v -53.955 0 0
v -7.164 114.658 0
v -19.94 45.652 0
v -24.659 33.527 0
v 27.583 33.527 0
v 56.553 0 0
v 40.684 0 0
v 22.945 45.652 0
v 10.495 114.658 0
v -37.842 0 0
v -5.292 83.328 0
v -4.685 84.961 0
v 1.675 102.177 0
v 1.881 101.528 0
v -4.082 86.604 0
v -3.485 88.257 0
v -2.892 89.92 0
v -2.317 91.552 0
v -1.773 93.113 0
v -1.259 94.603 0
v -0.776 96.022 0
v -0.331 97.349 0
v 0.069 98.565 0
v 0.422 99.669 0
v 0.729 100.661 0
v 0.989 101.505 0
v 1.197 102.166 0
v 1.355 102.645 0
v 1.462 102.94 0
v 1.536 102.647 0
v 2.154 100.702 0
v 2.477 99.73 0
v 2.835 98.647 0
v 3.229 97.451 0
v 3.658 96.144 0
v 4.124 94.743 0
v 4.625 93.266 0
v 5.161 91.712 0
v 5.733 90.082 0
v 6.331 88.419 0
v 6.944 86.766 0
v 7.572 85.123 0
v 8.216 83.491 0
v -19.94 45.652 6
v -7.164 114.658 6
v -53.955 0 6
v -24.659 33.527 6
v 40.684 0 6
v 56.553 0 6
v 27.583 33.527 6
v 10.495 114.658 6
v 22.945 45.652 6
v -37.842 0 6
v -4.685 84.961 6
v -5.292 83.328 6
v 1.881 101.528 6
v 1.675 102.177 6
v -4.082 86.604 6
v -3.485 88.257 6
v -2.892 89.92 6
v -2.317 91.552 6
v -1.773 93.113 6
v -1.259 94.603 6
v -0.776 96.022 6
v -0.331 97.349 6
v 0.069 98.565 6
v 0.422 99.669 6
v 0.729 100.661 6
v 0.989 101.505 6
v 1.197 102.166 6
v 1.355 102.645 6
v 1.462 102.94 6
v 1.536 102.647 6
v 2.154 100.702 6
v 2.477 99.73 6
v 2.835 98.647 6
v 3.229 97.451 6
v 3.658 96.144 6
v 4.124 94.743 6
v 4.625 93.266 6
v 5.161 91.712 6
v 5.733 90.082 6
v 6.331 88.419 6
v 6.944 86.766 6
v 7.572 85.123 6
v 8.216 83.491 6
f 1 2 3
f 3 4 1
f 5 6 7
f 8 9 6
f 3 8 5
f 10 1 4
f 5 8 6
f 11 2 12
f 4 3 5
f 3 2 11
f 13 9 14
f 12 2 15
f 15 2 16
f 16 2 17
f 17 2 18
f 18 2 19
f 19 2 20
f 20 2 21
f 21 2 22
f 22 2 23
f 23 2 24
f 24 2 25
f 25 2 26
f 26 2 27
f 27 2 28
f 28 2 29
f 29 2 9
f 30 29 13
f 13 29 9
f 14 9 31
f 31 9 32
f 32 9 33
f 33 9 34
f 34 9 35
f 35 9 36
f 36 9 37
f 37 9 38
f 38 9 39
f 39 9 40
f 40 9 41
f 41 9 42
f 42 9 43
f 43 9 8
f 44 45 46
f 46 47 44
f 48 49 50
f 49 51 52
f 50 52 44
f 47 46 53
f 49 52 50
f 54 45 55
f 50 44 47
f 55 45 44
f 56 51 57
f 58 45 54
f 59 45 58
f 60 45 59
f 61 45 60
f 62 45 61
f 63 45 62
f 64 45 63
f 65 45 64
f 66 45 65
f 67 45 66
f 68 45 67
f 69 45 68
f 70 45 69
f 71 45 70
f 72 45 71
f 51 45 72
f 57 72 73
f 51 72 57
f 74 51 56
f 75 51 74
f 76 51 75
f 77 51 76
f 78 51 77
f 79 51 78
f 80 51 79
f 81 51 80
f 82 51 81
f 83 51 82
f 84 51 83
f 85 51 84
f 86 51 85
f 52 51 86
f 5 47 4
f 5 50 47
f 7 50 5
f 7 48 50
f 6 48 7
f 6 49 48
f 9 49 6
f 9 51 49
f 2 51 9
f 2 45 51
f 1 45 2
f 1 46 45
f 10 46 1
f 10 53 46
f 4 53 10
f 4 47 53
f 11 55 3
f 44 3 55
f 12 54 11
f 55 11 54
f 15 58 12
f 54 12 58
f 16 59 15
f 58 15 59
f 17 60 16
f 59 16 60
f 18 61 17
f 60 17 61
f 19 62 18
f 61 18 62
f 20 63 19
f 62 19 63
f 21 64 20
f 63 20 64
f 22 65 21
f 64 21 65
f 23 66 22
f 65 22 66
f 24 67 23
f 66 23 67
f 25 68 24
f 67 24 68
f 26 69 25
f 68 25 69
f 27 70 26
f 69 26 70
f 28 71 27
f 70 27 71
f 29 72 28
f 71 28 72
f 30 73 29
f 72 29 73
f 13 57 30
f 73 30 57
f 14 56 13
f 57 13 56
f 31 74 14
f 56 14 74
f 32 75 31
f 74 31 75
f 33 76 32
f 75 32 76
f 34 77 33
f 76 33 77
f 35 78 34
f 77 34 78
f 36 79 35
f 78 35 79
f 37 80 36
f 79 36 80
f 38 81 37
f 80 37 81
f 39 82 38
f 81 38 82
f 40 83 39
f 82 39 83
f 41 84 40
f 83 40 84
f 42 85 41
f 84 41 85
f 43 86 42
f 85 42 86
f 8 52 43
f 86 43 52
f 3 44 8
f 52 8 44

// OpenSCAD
// file: ../geometry/contact_sheet.scad
//////////////////////////////////////////////////////////////////////
// LibFile: contact_sheet.scad
// Project: Glyph Dossier
// FileGroup: Diagnostic Rendering
// FileSummary: Representative-set preview grid.
//////////////////////////////////////////////////////////////////////

module _contact_cell_frame(cell_size, depth) {
    frame_thickness = 0.8;

    color([0.35, 0.40, 0.48, 0.35])
        linear_extrude(height = depth)
            difference() {
                square(
                    [cell_size, cell_size],
                    center = true
                );
                square(
                    [
                        cell_size - 2 * frame_thickness,
                        cell_size - 2 * frame_thickness
                    ],
                    center = true
                );
            }
}

module glyph_contact_sheet(
    ids,
    records,
    source_kind,
    font_name,
    columns,
    cell_size,
    glyph_size,
    depth
) {
    rows = ceil(len(ids) / columns);

    for (index = [0 : len(ids) - 1]) {
        row = floor(index / columns);
        column = index % columns;
        x = (column - (columns - 1) / 2) * cell_size;
        y = ((rows - 1) / 2 - row) * cell_size;
        dossier = named_record(
            records,
            ids[index],
            "contact-sheet dossier"
        );

        translate([x, y, 0]) {
            _contact_cell_frame(cell_size, 0.6);

            color([0.88, 0.68, 0.24])
                translate([0, -glyph_size * 0.25, 0.8])
                    glyph_profile_3d(
                        dossier,
                        source_kind,
                        font_name,
                        glyph_size,
                        depth
                    );
        }
    }
}
// file: ../geometry/dossier_scene.scad
//////////////////////////////////////////////////////////////////////
// LibFile: dossier_scene.scad
// Project: Glyph Dossier
// FileGroup: Diagnostic Rendering
// FileSummary: Individual profile and guide-frame render modes.
//////////////////////////////////////////////////////////////////////

module render_glyph_dossier(
    dossier,
    render_mode,
    source_kind,
    font_name,
    nominal_size,
    extrusion_depth,
    guide_depth,
    show_guides,
    show_frame,
    x_height_ratio,
    cap_height_ratio,
    ascender_ratio,
    descender_ratio
) {
    if (render_mode == "profile_2d") {
        glyph_source_2d(
            dossier,
            source_kind,
            font_name,
            nominal_size
        );
    } else if (render_mode == "profile_3d") {
        glyph_profile_3d(
            dossier,
            source_kind,
            font_name,
            nominal_size,
            extrusion_depth
        );
    } else if (render_mode == "dossier") {
        if (show_guides)
            color([0.45, 0.55, 0.70, 0.45])
                nominal_guides_3d(
                    nominal_size,
                    guide_depth,
                    x_height_ratio,
                    cap_height_ratio,
                    ascender_ratio,
                    descender_ratio,
                    show_frame
                );

        color([0.88, 0.68, 0.24])
            translate([0, 0, guide_depth + 0.2])
                glyph_profile_3d(
                    dossier,
                    source_kind,
                    font_name,
                    nominal_size,
                    extrusion_depth
                );
    }
}
// file: ../geometry/analysis_guides.scad
//////////////////////////////////////////////////////////////////////
// LibFile: analysis_guides.scad
// Project: Glyph Dossier
// FileGroup: Diagnostic Geometry
// FileSummary: Nominal, non-measured baseline and height guides.
//////////////////////////////////////////////////////////////////////

module _guide_line_2d(width, thickness, y) {
    translate([0, y])
        square([width, thickness], center = true);
}

module nominal_guides_2d(
    nominal_size,
    x_height_ratio,
    cap_height_ratio,
    ascender_ratio,
    descender_ratio,
    show_frame = true
) {
    guide_width = nominal_size * 1.45;
    thickness = max(0.35, nominal_size * 0.004);
    lower = -nominal_size * descender_ratio;
    upper = nominal_size * ascender_ratio;

    union() {
        _guide_line_2d(guide_width, thickness, 0);
        _guide_line_2d(
            guide_width,
            thickness,
            nominal_size * x_height_ratio
        );
        _guide_line_2d(
            guide_width,
            thickness,
            nominal_size * cap_height_ratio
        );
        _guide_line_2d(guide_width, thickness, upper);
        _guide_line_2d(guide_width, thickness, lower);

        if (show_frame)
            difference() {
                translate([0, (upper + lower) / 2])
                    square(
                        [guide_width, upper - lower],
                        center = true
                    );
                translate([0, (upper + lower) / 2])
                    square(
                        [
                            guide_width - 2 * thickness,
                            upper - lower - 2 * thickness
                        ],
                        center = true
                    );
            }
    }
}

module nominal_guides_3d(
    nominal_size,
    depth,
    x_height_ratio,
    cap_height_ratio,
    ascender_ratio,
    descender_ratio,
    show_frame = true
) {
    linear_extrude(height = depth)
        nominal_guides_2d(
            nominal_size,
            x_height_ratio,
            cap_height_ratio,
            ascender_ratio,
            descender_ratio,
            show_frame
        );
}
// file: ../geometry/glyph_profile.scad
//////////////////////////////////////////////////////////////////////
// LibFile: glyph_profile.scad
// Project: Glyph Dossier
// FileGroup: Source Adapter
// FileSummary: Font-backed 2D and extruded glyph profiles.
//////////////////////////////////////////////////////////////////////

module font_glyph_2d(glyph, font_name, nominal_size) {
    if (font_name == "")
        text(
            text = glyph,
            size = nominal_size,
            halign = "center",
            valign = "baseline"
        );
    else
        text(
            text = glyph,
            size = nominal_size,
            font = font_name,
            halign = "center",
            valign = "baseline"
        );
}

module glyph_source_2d(
    dossier,
    source_kind,
    font_name,
    nominal_size
) {
    assert(
        source_kind == "font",
        str("Batch 001 does not implement source kind: ", source_kind)
    );

    font_glyph_2d(
        dossier[GD_GLYPH],
        font_name,
        nominal_size
    );
}

module glyph_profile_3d(
    dossier,
    source_kind,
    font_name,
    nominal_size,
    depth
) {
    linear_extrude(height = depth)
        glyph_source_2d(
            dossier,
            source_kind,
            font_name,
            nominal_size
        );
}
// file: ../lib/reporting.scad
//////////////////////////////////////////////////////////////////////
// LibFile: reporting.scad
// Project: Glyph Dossier
// FileGroup: Console Reporting
// FileSummary: Reports project, source, dossier, and study-set data.
//////////////////////////////////////////////////////////////////////

module report_project(project, report_level = "full") {
    echo("GLYPH_DOSSIER_PROJECT", project[PR_NAME]);
    echo("GLYPH_DOSSIER_KIND", project[PR_KIND]);
    echo("GLYPH_DOSSIER_EDITION", project[PR_EDITION]);
    echo("GLYPH_DOSSIER_BASELINE", project[PR_BASELINE]);

    if (report_level == "full") {
        echo("GLYPH_DOSSIER_SCOPE", project[PR_SCOPE]);
        echo("GLYPH_DOSSIER_STATUS", project[PR_STATUS]);
    }
}

module report_catalog_notice(project) {
    echo("GLYPH_DOSSIER_CATALOG", project[PR_STATUS]);
}

module report_source(
    source_kind,
    font_name,
    font_license,
    font_source_url,
    font_revision
) {
    echo("GLYPH_SOURCE_KIND", source_kind);
    echo(
        "GLYPH_FONT_NAME",
        font_name == "" ? "OpenSCAD default font" : font_name
    );
    echo("GLYPH_FONT_LICENSE", font_license);
    echo("GLYPH_FONT_SOURCE_URL", font_source_url);
    echo("GLYPH_FONT_REVISION", font_revision);
}

module report_glyph_dossier(dossier, report_level = "full") {
    echo("DOSSIER_ID", dossier[GD_ID]);
    echo("DOSSIER_GLYPH", dossier[GD_GLYPH]);
    echo("DOSSIER_GROUP", dossier[GD_GROUP]);
    echo("DOSSIER_ARCHETYPE", dossier[GD_ARCHETYPE]);
    echo("DOSSIER_COMPONENT_RANGE", [
        dossier[GD_COMPONENTS_MIN],
        dossier[GD_COMPONENTS_MAX]
    ]);
    echo("DOSSIER_COUNTER_RANGE", [
        dossier[GD_COUNTERS_MIN],
        dossier[GD_COUNTERS_MAX]
    ]);
    echo("DOSSIER_VERTICAL_CLASS", dossier[GD_VERTICAL_CLASS]);
    echo("DOSSIER_PRIORITY", dossier[GD_PRIORITY]);

    if (report_level == "full") {
        echo("DOSSIER_FEATURES", dossier[GD_FEATURES]);
        echo("DOSSIER_SECTION_RISKS", dossier[GD_RISKS]);
        echo("DOSSIER_FONT_VARIANTS", dossier[GD_VARIANTS]);
        echo("DOSSIER_NOTE", dossier[GD_NOTE]);
    }
}

module report_study_set(set_name, ids) {
    echo("STUDY_SET_NAME", set_name);
    echo("STUDY_SET_COUNT", len(ids));
    echo("STUDY_SET_IDS", ids);
}
// file: ../lib/validation.scad
//////////////////////////////////////////////////////////////////////
// LibFile: validation.scad
// Project: Glyph Dossier
// FileGroup: Contract Validation
// FileSummary: Validates projects, dossiers, registries, and study sets.
//////////////////////////////////////////////////////////////////////

VALID_GROUPS = [
    "uppercase",
    "lowercase",
    "digit",
    "punctuation"
];

VALID_PRIORITIES = [
    "primary",
    "secondary",
    "coverage"
];

VALID_VERTICAL_CLASSES = [
    "cap",
    "x_height",
    "ascender",
    "descender",
    "x_height_dot",
    "descender_dot",
    "digit_height",
    "cap_punctuation",
    "x_punctuation",
    "descender_punctuation"
];

function count_group(records, group_name) =
    len([
        for (record = records)
            if (record[GD_GROUP] == group_name)
                record
    ]);

module validate_project(project) {
    assert(
        len(project) == 6,
        str("Project record must contain 6 fields; found ", len(project))
    );
    assert(
        project[PR_KIND] == "laboratory"
        || project[PR_KIND] == "catalog_notice",
        str("Unsupported project kind: ", project[PR_KIND])
    );
    assert(len(project[PR_NAME]) > 0, "Project name must not be empty.");
}

module validate_glyph_dossier(dossier) {
    assert(
        len(dossier) == 14,
        str(
            "Glyph dossier must contain 14 fields; found ",
            len(dossier)
        )
    );
    assert(len(dossier[GD_ID]) > 0, "Glyph dossier ID is empty.");
    assert(len(dossier[GD_GLYPH]) == 1,
        str("Glyph must contain one character: ", dossier[GD_ID]));
    assert(value_in_list(VALID_GROUPS, dossier[GD_GROUP]),
        str("Unknown glyph group: ", dossier[GD_GROUP]));
    assert(len(dossier[GD_ARCHETYPE]) > 0,
        str("Archetype is empty: ", dossier[GD_ID]));
    assert(dossier[GD_COMPONENTS_MIN] >= 1,
        str("Component minimum is invalid: ", dossier[GD_ID]));
    assert(
        dossier[GD_COMPONENTS_MAX] >= dossier[GD_COMPONENTS_MIN],
        str("Component range is invalid: ", dossier[GD_ID])
    );
    assert(dossier[GD_COUNTERS_MIN] >= 0,
        str("Counter minimum is invalid: ", dossier[GD_ID]));
    assert(
        dossier[GD_COUNTERS_MAX] >= dossier[GD_COUNTERS_MIN],
        str("Counter range is invalid: ", dossier[GD_ID])
    );
    assert(
        value_in_list(
            VALID_VERTICAL_CLASSES,
            dossier[GD_VERTICAL_CLASS]
        ),
        str(
            "Unknown vertical class ",
            dossier[GD_VERTICAL_CLASS],
            " in ",
            dossier[GD_ID]
        )
    );
    assert(len(dossier[GD_FEATURES]) > 0,
        str("Feature list is empty: ", dossier[GD_ID]));
    assert(len(dossier[GD_RISKS]) > 0,
        str("Risk list is empty: ", dossier[GD_ID]));
    assert(
        value_in_list(VALID_PRIORITIES, dossier[GD_PRIORITY]),
        str("Unknown priority: ", dossier[GD_PRIORITY])
    );
    assert(len(dossier[GD_NOTE]) > 0,
        str("Design note is empty: ", dossier[GD_ID]));
}

module validate_glyph_registry(records) {
    assert(len(records) == 66,
        str("Expected 66 glyph dossiers; found ", len(records)));
    assert(count_group(records, "uppercase") == 26,
        "Uppercase registry must contain 26 dossiers.");
    assert(count_group(records, "lowercase") == 26,
        "Lowercase registry must contain 26 dossiers.");
    assert(count_group(records, "digit") == 10,
        "Digit registry must contain 10 dossiers.");
    assert(count_group(records, "punctuation") == 4,
        "Punctuation registry must contain 4 dossiers.");

    for (record = records) {
        validate_glyph_dossier(record);
        assert(
            exact_name_count(records, record[GD_ID]) == 1,
            str("Duplicate dossier ID: ", record[GD_ID])
        );
    }
}

module validate_id_set(ids, records, set_name) {
    assert(len(ids) > 0, str(set_name, " is empty."));

    for (id = ids)
        assert(
            exact_name_count(records, id) == 1,
            str(
                "Expected one dossier for ",
                id,
                " in ",
                set_name
            )
        );

    for (id = ids)
        assert(
            len([for (candidate = ids) if (candidate == id) candidate])
                == 1,
            str("Duplicate ID in ", set_name, ": ", id)
        );
}
// file: ../lib/lookup.scad
//////////////////////////////////////////////////////////////////////
// LibFile: lookup.scad
// Project: Glyph Dossier
// FileGroup: Exact Lookup
// FileSummary: Requires exactly one matching named record.
//////////////////////////////////////////////////////////////////////

function named_matches(records, name) = [
    for (record = records)
        if (record_name(record) == name)
            record
];

function named_record(records, name, record_kind = "record") =
    let(matches = named_matches(records, name))
    assert(
        len(matches) == 1,
        str(
            "Expected exactly one ",
            record_kind,
            " named ",
            name,
            "; found ",
            len(matches)
        )
    )
    matches[0];

function exact_name_count(records, name) =
    len(named_matches(records, name));
// file: ../config/workbenches.scad
//////////////////////////////////////////////////////////////////////
// LibFile: workbenches.scad
// Project: Glyph Dossier
// FileGroup: Workbench Contracts
// FileSummary: Declares supported workbenches and render modes.
//////////////////////////////////////////////////////////////////////

VALID_WORKBENCHES = [
    "development",
    "laboratory",
    "profile",
    "contact_sheet",
    "catalog"
];

VALID_RENDER_MODES = [
    "dossier",
    "profile_2d",
    "profile_3d",
    "contact_sheet",
    "report_only"
];

VALID_SOURCE_KINDS = [
    "font"
];

function value_in_list(values, value) =
    len([for (candidate = values) if (candidate == value) candidate]) > 0;

module validate_workbench_selection(
    workbench_name,
    render_mode,
    source_kind
) {
    assert(
        value_in_list(VALID_WORKBENCHES, workbench_name),
        str("Unknown workbench: ", workbench_name)
    );
    assert(
        value_in_list(VALID_RENDER_MODES, render_mode),
        str("Unknown render mode: ", render_mode)
    );
    assert(
        value_in_list(VALID_SOURCE_KINDS, source_kind),
        str("Unsupported Batch 001 source kind: ", source_kind)
    );
}
// file: ../config/glyphs.scad
//////////////////////////////////////////////////////////////////////
// LibFile: glyphs.scad
// Project: Glyph Dossier
// FileGroup: Registry Composition
// FileSummary: Exposes the complete character-analysis registry.
//////////////////////////////////////////////////////////////////////

ALL_GLYPHS = concat(
    UPPERCASE_GLYPHS,
    LOWERCASE_GLYPHS,
    DIGIT_GLYPHS,
    PUNCTUATION_GLYPHS
);
// file: ../registries/study_sets.scad
//////////////////////////////////////////////////////////////////////
// LibFile: study_sets.scad
// Project: Glyph Dossier
// FileGroup: Study Registry
// FileSummary: Representative character sets for focused analysis.
//////////////////////////////////////////////////////////////////////

REPRESENTATIVE_SET_IDS = [
    "U_A",
    "U_B",
    "U_O",
    "U_S",
    "U_Z",
    "L_a",
    "L_g",
    "L_i",
    "L_j",
    "L_m",
    "L_s",
    "D_0",
    "D_1",
    "D_2",
    "D_4",
    "D_8",
    "P_question",
    "P_exclamation",
    "P_colon",
    "P_semicolon"
];
// file: ../registries/punctuation.scad
//////////////////////////////////////////////////////////////////////
// LibFile: punctuation_glyphs.scad
// Project: Glyph Dossier
// FileGroup: Character Registry
// FileSummary: Character-level dossiers for question, exclamation, colon, and semicolon.
//////////////////////////////////////////////////////////////////////

PUNCTUATION_GLYPHS = [
    glyph_dossier(
        "P_question",
        "?",
        "punctuation",
        "curved_mark_dot",
        2,
        2,
        0,
        0,
        "cap_punctuation",
        ["upper_curve", "narrow_transition", "terminal", "separate_dot"],
        ["dot_loss", "component_assignment", "curve_cut", "narrow_transition"],
        ["curve_shape", "dot_shape", "terminal_angle"],
        "primary",
        "Primary punctuation test combining a complex main mark and separate dot."
    ),
    glyph_dossier(
        "P_exclamation",
        "!",
        "punctuation",
        "stem_dot",
        2,
        2,
        0,
        0,
        "cap_punctuation",
        ["main_stem", "separate_dot"],
        ["dot_loss", "stem_fragment", "component_assignment"],
        ["tapered_stem", "rectangular_stem", "dot_shape"],
        "primary",
        "Primary two-component punctuation control glyph."
    ),
    glyph_dossier(
        "P_colon",
        ":",
        "punctuation",
        "paired_dots",
        2,
        2,
        0,
        0,
        "x_punctuation",
        ["upper_dot", "lower_dot"],
        ["component_loss", "component_assignment", "small_part"],
        ["round_dots", "square_dots"],
        "primary",
        "Primary test consisting entirely of disconnected small components."
    ),
    glyph_dossier(
        "P_semicolon",
        ";",
        "punctuation",
        "dot_descending_mark",
        2,
        2,
        0,
        0,
        "descender_punctuation",
        ["upper_dot", "lower_comma_tail"],
        ["component_loss", "tail_fragment", "component_assignment"],
        ["tail_angle", "dot_shape"],
        "primary",
        "Tests disconnected punctuation with a descending curved component."
    )
];
// file: ../registries/digits.scad
//////////////////////////////////////////////////////////////////////
// LibFile: digit_glyphs.scad
// Project: Glyph Dossier
// FileGroup: Character Registry
// FileSummary: Character-level dossiers for digits 0 through 9.
//////////////////////////////////////////////////////////////////////

DIGIT_GLYPHS = [
    glyph_dossier(
        "D_0",
        "0",
        "digit",
        "closed_ring",
        1,
        1,
        1,
        1,
        "digit_height",
        ["outer_curve", "counter", "continuous_ring"],
        ["counter_collapse", "ring_thickness_loss", "letter_confusion"],
        ["slashed_zero", "dotted_zero", "oval_width"],
        "primary",
        "Primary digit ring test and distinction from uppercase O."
    ),
    glyph_dossier(
        "D_1",
        "1",
        "digit",
        "stem_flag_base",
        1,
        1,
        0,
        0,
        "digit_height",
        ["main_stem", "possible_flag", "possible_base"],
        ["narrow_part", "flag_fragment", "base_fragment"],
        ["plain_stem", "top_flag", "bottom_base", "serifed"],
        "primary",
        "Primary font-variation and narrow-digit test."
    ),
    glyph_dossier(
        "D_2",
        "2",
        "digit",
        "curve_diagonal_base",
        1,
        1,
        0,
        0,
        "digit_height",
        ["upper_curve", "diagonal_transition", "bottom_bar"],
        ["curve_diagonal_cut", "bottom_bar_fragment", "thin_transition"],
        ["flat_or_curved_base", "diagonal_angle"],
        "primary",
        "Primary mixed curve, diagonal, and horizontal test."
    ),
    glyph_dossier(
        "D_3",
        "3",
        "digit",
        "double_open_bowl",
        1,
        1,
        0,
        0,
        "digit_height",
        ["upper_curve", "lower_curve", "central_waist"],
        ["waist_fragment", "curve_cut", "terminal_fragment"],
        ["upper_lower_balance", "flat_or_rounded_spine"],
        "coverage",
        "Tests two open curved lobes and a narrow waist."
    ),
    glyph_dossier(
        "D_4",
        "4",
        "digit",
        "crossbar_diagonal_stem",
        1,
        1,
        0,
        1,
        "digit_height",
        ["diagonal", "vertical_stem", "crossbar", "possible_counter"],
        ["form_substitution", "crossbar_cut", "counter_collapse", "junction_cut"],
        ["open_four", "closed_four", "crossbar_height"],
        "primary",
        "Primary digit form-variation and junction test."
    ),
    glyph_dossier(
        "D_5",
        "5",
        "digit",
        "top_stem_lower_curve",
        1,
        1,
        0,
        0,
        "digit_height",
        ["top_bar", "upper_stem", "lower_curve"],
        ["curve_stem_cut", "top_bar_fragment", "waist_fragment"],
        ["flat_or_curved_top", "lower_bowl_size"],
        "coverage",
        "Tests abrupt transition from rectilinear to curved geometry."
    ),
    glyph_dossier(
        "D_6",
        "6",
        "digit",
        "loop_open_tail",
        1,
        1,
        1,
        1,
        "digit_height",
        ["lower_loop", "counter", "upper_open_curve"],
        ["counter_collapse", "neck_cut", "terminal_fragment"],
        ["loop_size", "terminal_angle"],
        "coverage",
        "Tests one counter with an open upper continuation."
    ),
    glyph_dossier(
        "D_7",
        "7",
        "digit",
        "topbar_diagonal",
        1,
        1,
        0,
        0,
        "digit_height",
        ["top_bar", "long_diagonal", "possible_crossbar"],
        ["diagonal_cut", "top_bar_fragment", "crossbar_fragment"],
        ["crossed_seven", "plain_seven", "serifed"],
        "coverage",
        "Tests a long diagonal and optional crossbar."
    ),
    glyph_dossier(
        "D_8",
        "8",
        "digit",
        "double_closed_loop",
        1,
        1,
        2,
        2,
        "digit_height",
        ["upper_loop", "lower_loop", "two_counters", "central_waist"],
        ["counter_collapse", "waist_fragment", "loop_boundary_cut"],
        ["upper_lower_balance", "waist_width"],
        "primary",
        "Primary two-counter digit test."
    ),
    glyph_dossier(
        "D_9",
        "9",
        "digit",
        "loop_descending_tail",
        1,
        1,
        1,
        1,
        "digit_height",
        ["upper_loop", "counter", "lower_open_tail"],
        ["counter_collapse", "neck_cut", "tail_fragment"],
        ["loop_size", "tail_angle"],
        "coverage",
        "Tests one upper counter with a descending open continuation."
    )
];
// file: ../config/projects.scad
//////////////////////////////////////////////////////////////////////
// LibFile: projects.scad
// Project: Glyph Dossier
// FileGroup: Registry Routing
// FileSummary: Exposes the active project registry.
//////////////////////////////////////////////////////////////////////

PROJECTS = wb_workbench_name == "catalog"
    ? CATALOG_PROJECTS
    : LABORATORY_PROJECTS;
// file: ../registries/catalog_projects.scad
//////////////////////////////////////////////////////////////////////
// LibFile: catalog_projects.scad
// Project: Glyph Dossier
// FileGroup: Read-Only Registry
// FileSummary: Catalog remains empty until physical acceptance.
//////////////////////////////////////////////////////////////////////

CATALOG_PROJECTS = [
    glyph_project(
        "NO_ACCEPTED_GLYPH_OBJECTS",
        "catalog_notice",
        "0.1.0",
        "Physically accepted source-specific glyph objects.",
        "commit-7940732-batch-001",
        "No accepted glyph objects."
    )
];
// file: ../registries/laboratory_projects.scad
//////////////////////////////////////////////////////////////////////
// LibFile: laboratory_projects.scad
// Project: Glyph Dossier
// FileGroup: Mutable Registry
// FileSummary: Active analysis project.
//////////////////////////////////////////////////////////////////////

LABORATORY_PROJECTS = [
    glyph_project(
        "GLYPH_DOSSIER_LAB",
        "laboratory",
        "0.1.0",
        "Character anatomy and risk analysis before sectioning.",
        "commit-7940732-batch-001",
        "Analysis registry active; no physical objects accepted."
    )
];
// file: ../lib/schema.scad
//////////////////////////////////////////////////////////////////////
// LibFile: schema.scad
// Project: Glyph Dossier
// FileGroup: Record Schema
// FileSummary: Project and glyph dossier constructors and indexes.
//////////////////////////////////////////////////////////////////////

PR_NAME = 0;
PR_KIND = 1;
PR_EDITION = 2;
PR_SCOPE = 3;
PR_BASELINE = 4;
PR_STATUS = 5;

function glyph_project(
    name,
    kind,
    edition,
    scope,
    baseline,
    status
) = [
    name,
    kind,
    edition,
    scope,
    baseline,
    status
];

GD_ID = 0;
GD_GLYPH = 1;
GD_GROUP = 2;
GD_ARCHETYPE = 3;
GD_COMPONENTS_MIN = 4;
GD_COMPONENTS_MAX = 5;
GD_COUNTERS_MIN = 6;
GD_COUNTERS_MAX = 7;
GD_VERTICAL_CLASS = 8;
GD_FEATURES = 9;
GD_RISKS = 10;
GD_VARIANTS = 11;
GD_PRIORITY = 12;
GD_NOTE = 13;

function glyph_dossier(
    id,
    glyph,
    group,
    archetype,
    components_min,
    components_max,
    counters_min,
    counters_max,
    vertical_class,
    features,
    risks,
    variants,
    priority,
    note
) = [
    id,
    glyph,
    group,
    archetype,
    components_min,
    components_max,
    counters_min,
    counters_max,
    vertical_class,
    features,
    risks,
    variants,
    priority,
    note
];

function record_name(record) = record[0];
// file: ../config/defaults.scad
//////////////////////////////////////////////////////////////////////
// LibFile: defaults.scad
// Project: Glyph Dossier
// FileGroup: Workbench Configuration
// FileSummary: Resolves wrapper inputs into stable wb_* values.
//////////////////////////////////////////////////////////////////////

wb_workbench_name = is_undef(workbench_name)
    ? "development" : workbench_name;
wb_project_name = is_undef(project_name_selected)
    ? "GLYPH_DOSSIER_LAB" : project_name_selected;
wb_glyph_id = is_undef(glyph_id_selected)
    ? "U_A" : glyph_id_selected;
wb_render_mode = is_undef(render_mode)
    ? "dossier" : render_mode;
wb_report_level = is_undef(report_level)
    ? "full" : report_level;

wb_source_kind = is_undef(source_kind)
    ? "font" : source_kind;
wb_font_name = is_undef(font_name)
    ? "" : font_name;
wb_font_license = is_undef(font_license)
    ? "unrecorded" : font_license;
wb_font_source_url = is_undef(font_source_url)
    ? "" : font_source_url;
wb_font_revision = is_undef(font_revision)
    ? "" : font_revision;

wb_nominal_size = is_undef(nominal_size)
    ? 120 : nominal_size;
wb_extrusion_depth = is_undef(extrusion_depth)
    ? 6 : extrusion_depth;
wb_guide_depth = is_undef(guide_depth)
    ? 0.8 : guide_depth;
wb_show_guides = is_undef(show_guides)
    ? true : show_guides;
wb_show_frame = is_undef(show_frame)
    ? true : show_frame;

wb_x_height_ratio = is_undef(x_height_ratio)
    ? 0.52 : x_height_ratio;
wb_cap_height_ratio = is_undef(cap_height_ratio)
    ? 0.72 : cap_height_ratio;
wb_ascender_ratio = is_undef(ascender_ratio)
    ? 0.78 : ascender_ratio;
wb_descender_ratio = is_undef(descender_ratio)
    ? 0.22 : descender_ratio;

wb_sheet_columns = is_undef(sheet_columns)
    ? 5 : sheet_columns;
wb_sheet_cell_size = is_undef(sheet_cell_size)
    ? 72 : sheet_cell_size;
wb_sheet_glyph_size = is_undef(sheet_glyph_size)
    ? 42 : sheet_glyph_size;
wb_sheet_depth = is_undef(sheet_depth)
    ? 2 : sheet_depth;
// file: ../main.scad
//////////////////////////////////////////////////////////////////////
// LibFile: main.scad
// Project: Glyph Dossier
// FileGroup: Shared Workbench Orchestrator
// FileSummary: Resolves, validates, reports, and dispatches analysis.
//////////////////////////////////////////////////////////////////////

include <config/defaults.scad>
include <lib/schema.scad>
include <registries/laboratory_projects.scad>
include <registries/catalog_projects.scad>
include <config/projects.scad>

include <registries/uppercase.scad>
include <registries/lowercase.scad>
include <registries/digits.scad>
include <registries/punctuation.scad>
include <registries/study_sets.scad>
include <config/glyphs.scad>

include <config/workbenches.scad>
include <lib/lookup.scad>
include <lib/validation.scad>
include <lib/reporting.scad>
include <geometry/glyph_profile.scad>
include <geometry/analysis_guides.scad>
include <geometry/dossier_scene.scad>
include <geometry/contact_sheet.scad>

module run_glyph_dossier() {
    validate_workbench_selection(
        wb_workbench_name,
        wb_render_mode,
        wb_source_kind
    );

    project = named_record(
        PROJECTS,
        wb_project_name,
        "Glyph Dossier project"
    );

    validate_project(project);
    validate_glyph_registry(ALL_GLYPHS);
    report_project(project, wb_report_level);
    report_source(
        wb_source_kind,
        wb_font_name,
        wb_font_license,
        wb_font_source_url,
        wb_font_revision
    );

    if (project[PR_KIND] == "catalog_notice") {
        report_catalog_notice(project);
    } else if (wb_render_mode == "contact_sheet") {
        validate_id_set(
            REPRESENTATIVE_SET_IDS,
            ALL_GLYPHS,
            "representative study set"
        );
        report_study_set(
            "REPRESENTATIVE_SET",
            REPRESENTATIVE_SET_IDS
        );
        glyph_contact_sheet(
            REPRESENTATIVE_SET_IDS,
            ALL_GLYPHS,
            wb_source_kind,
            wb_font_name,
            wb_sheet_columns,
            wb_sheet_cell_size,
            wb_sheet_glyph_size,
            wb_sheet_depth
        );
    } else {
        dossier = named_record(
            ALL_GLYPHS,
            wb_glyph_id,
            "glyph dossier"
        );

        validate_glyph_dossier(dossier);
        report_glyph_dossier(dossier, wb_report_level);

        if (wb_render_mode != "report_only")
            render_glyph_dossier(
                dossier,
                wb_render_mode,
                wb_source_kind,
                wb_font_name,
                wb_nominal_size,
                wb_extrusion_depth,
                wb_guide_depth,
                wb_show_guides,
                wb_show_frame,
                wb_x_height_ratio,
                wb_cap_height_ratio,
                wb_ascender_ratio,
                wb_descender_ratio
            );
    }
}

run_glyph_dossier();
// main file
//////////////////////////////////////////////////////////////////////
// LibFile: profile.scad
// Project: Glyph Dossier
// FileGroup: Executable Workbench
// FileSummary: Clean individual glyph extrusion without guides.
//////////////////////////////////////////////////////////////////////

render_mode = "profile_3d";
report_level = "full";

/* [Character] */
glyph_id_selected = "U_A";

/* [Source] */
source_kind = "font";
font_name = "";
font_license = "unrecorded";
font_source_url = "";
font_revision = "";

/* [Profile] */
nominal_size = 120;
extrusion_depth = 6;

/* [Nominal analysis guides] */
guide_depth = 0.8;
show_guides = true;
show_frame = true;
x_height_ratio = 0.52;
cap_height_ratio = 0.72;
ascender_ratio = 0.78;
descender_ratio = 0.22;

/* [Contact sheet] */
sheet_columns = 5;
sheet_cell_size = 72;
sheet_glyph_size = 42;
sheet_depth = 2;


/* [Hidden] */
workbench_name = "profile";
project_name_selected = "GLYPH_DOSSIER_LAB";

include <../main.scad>
